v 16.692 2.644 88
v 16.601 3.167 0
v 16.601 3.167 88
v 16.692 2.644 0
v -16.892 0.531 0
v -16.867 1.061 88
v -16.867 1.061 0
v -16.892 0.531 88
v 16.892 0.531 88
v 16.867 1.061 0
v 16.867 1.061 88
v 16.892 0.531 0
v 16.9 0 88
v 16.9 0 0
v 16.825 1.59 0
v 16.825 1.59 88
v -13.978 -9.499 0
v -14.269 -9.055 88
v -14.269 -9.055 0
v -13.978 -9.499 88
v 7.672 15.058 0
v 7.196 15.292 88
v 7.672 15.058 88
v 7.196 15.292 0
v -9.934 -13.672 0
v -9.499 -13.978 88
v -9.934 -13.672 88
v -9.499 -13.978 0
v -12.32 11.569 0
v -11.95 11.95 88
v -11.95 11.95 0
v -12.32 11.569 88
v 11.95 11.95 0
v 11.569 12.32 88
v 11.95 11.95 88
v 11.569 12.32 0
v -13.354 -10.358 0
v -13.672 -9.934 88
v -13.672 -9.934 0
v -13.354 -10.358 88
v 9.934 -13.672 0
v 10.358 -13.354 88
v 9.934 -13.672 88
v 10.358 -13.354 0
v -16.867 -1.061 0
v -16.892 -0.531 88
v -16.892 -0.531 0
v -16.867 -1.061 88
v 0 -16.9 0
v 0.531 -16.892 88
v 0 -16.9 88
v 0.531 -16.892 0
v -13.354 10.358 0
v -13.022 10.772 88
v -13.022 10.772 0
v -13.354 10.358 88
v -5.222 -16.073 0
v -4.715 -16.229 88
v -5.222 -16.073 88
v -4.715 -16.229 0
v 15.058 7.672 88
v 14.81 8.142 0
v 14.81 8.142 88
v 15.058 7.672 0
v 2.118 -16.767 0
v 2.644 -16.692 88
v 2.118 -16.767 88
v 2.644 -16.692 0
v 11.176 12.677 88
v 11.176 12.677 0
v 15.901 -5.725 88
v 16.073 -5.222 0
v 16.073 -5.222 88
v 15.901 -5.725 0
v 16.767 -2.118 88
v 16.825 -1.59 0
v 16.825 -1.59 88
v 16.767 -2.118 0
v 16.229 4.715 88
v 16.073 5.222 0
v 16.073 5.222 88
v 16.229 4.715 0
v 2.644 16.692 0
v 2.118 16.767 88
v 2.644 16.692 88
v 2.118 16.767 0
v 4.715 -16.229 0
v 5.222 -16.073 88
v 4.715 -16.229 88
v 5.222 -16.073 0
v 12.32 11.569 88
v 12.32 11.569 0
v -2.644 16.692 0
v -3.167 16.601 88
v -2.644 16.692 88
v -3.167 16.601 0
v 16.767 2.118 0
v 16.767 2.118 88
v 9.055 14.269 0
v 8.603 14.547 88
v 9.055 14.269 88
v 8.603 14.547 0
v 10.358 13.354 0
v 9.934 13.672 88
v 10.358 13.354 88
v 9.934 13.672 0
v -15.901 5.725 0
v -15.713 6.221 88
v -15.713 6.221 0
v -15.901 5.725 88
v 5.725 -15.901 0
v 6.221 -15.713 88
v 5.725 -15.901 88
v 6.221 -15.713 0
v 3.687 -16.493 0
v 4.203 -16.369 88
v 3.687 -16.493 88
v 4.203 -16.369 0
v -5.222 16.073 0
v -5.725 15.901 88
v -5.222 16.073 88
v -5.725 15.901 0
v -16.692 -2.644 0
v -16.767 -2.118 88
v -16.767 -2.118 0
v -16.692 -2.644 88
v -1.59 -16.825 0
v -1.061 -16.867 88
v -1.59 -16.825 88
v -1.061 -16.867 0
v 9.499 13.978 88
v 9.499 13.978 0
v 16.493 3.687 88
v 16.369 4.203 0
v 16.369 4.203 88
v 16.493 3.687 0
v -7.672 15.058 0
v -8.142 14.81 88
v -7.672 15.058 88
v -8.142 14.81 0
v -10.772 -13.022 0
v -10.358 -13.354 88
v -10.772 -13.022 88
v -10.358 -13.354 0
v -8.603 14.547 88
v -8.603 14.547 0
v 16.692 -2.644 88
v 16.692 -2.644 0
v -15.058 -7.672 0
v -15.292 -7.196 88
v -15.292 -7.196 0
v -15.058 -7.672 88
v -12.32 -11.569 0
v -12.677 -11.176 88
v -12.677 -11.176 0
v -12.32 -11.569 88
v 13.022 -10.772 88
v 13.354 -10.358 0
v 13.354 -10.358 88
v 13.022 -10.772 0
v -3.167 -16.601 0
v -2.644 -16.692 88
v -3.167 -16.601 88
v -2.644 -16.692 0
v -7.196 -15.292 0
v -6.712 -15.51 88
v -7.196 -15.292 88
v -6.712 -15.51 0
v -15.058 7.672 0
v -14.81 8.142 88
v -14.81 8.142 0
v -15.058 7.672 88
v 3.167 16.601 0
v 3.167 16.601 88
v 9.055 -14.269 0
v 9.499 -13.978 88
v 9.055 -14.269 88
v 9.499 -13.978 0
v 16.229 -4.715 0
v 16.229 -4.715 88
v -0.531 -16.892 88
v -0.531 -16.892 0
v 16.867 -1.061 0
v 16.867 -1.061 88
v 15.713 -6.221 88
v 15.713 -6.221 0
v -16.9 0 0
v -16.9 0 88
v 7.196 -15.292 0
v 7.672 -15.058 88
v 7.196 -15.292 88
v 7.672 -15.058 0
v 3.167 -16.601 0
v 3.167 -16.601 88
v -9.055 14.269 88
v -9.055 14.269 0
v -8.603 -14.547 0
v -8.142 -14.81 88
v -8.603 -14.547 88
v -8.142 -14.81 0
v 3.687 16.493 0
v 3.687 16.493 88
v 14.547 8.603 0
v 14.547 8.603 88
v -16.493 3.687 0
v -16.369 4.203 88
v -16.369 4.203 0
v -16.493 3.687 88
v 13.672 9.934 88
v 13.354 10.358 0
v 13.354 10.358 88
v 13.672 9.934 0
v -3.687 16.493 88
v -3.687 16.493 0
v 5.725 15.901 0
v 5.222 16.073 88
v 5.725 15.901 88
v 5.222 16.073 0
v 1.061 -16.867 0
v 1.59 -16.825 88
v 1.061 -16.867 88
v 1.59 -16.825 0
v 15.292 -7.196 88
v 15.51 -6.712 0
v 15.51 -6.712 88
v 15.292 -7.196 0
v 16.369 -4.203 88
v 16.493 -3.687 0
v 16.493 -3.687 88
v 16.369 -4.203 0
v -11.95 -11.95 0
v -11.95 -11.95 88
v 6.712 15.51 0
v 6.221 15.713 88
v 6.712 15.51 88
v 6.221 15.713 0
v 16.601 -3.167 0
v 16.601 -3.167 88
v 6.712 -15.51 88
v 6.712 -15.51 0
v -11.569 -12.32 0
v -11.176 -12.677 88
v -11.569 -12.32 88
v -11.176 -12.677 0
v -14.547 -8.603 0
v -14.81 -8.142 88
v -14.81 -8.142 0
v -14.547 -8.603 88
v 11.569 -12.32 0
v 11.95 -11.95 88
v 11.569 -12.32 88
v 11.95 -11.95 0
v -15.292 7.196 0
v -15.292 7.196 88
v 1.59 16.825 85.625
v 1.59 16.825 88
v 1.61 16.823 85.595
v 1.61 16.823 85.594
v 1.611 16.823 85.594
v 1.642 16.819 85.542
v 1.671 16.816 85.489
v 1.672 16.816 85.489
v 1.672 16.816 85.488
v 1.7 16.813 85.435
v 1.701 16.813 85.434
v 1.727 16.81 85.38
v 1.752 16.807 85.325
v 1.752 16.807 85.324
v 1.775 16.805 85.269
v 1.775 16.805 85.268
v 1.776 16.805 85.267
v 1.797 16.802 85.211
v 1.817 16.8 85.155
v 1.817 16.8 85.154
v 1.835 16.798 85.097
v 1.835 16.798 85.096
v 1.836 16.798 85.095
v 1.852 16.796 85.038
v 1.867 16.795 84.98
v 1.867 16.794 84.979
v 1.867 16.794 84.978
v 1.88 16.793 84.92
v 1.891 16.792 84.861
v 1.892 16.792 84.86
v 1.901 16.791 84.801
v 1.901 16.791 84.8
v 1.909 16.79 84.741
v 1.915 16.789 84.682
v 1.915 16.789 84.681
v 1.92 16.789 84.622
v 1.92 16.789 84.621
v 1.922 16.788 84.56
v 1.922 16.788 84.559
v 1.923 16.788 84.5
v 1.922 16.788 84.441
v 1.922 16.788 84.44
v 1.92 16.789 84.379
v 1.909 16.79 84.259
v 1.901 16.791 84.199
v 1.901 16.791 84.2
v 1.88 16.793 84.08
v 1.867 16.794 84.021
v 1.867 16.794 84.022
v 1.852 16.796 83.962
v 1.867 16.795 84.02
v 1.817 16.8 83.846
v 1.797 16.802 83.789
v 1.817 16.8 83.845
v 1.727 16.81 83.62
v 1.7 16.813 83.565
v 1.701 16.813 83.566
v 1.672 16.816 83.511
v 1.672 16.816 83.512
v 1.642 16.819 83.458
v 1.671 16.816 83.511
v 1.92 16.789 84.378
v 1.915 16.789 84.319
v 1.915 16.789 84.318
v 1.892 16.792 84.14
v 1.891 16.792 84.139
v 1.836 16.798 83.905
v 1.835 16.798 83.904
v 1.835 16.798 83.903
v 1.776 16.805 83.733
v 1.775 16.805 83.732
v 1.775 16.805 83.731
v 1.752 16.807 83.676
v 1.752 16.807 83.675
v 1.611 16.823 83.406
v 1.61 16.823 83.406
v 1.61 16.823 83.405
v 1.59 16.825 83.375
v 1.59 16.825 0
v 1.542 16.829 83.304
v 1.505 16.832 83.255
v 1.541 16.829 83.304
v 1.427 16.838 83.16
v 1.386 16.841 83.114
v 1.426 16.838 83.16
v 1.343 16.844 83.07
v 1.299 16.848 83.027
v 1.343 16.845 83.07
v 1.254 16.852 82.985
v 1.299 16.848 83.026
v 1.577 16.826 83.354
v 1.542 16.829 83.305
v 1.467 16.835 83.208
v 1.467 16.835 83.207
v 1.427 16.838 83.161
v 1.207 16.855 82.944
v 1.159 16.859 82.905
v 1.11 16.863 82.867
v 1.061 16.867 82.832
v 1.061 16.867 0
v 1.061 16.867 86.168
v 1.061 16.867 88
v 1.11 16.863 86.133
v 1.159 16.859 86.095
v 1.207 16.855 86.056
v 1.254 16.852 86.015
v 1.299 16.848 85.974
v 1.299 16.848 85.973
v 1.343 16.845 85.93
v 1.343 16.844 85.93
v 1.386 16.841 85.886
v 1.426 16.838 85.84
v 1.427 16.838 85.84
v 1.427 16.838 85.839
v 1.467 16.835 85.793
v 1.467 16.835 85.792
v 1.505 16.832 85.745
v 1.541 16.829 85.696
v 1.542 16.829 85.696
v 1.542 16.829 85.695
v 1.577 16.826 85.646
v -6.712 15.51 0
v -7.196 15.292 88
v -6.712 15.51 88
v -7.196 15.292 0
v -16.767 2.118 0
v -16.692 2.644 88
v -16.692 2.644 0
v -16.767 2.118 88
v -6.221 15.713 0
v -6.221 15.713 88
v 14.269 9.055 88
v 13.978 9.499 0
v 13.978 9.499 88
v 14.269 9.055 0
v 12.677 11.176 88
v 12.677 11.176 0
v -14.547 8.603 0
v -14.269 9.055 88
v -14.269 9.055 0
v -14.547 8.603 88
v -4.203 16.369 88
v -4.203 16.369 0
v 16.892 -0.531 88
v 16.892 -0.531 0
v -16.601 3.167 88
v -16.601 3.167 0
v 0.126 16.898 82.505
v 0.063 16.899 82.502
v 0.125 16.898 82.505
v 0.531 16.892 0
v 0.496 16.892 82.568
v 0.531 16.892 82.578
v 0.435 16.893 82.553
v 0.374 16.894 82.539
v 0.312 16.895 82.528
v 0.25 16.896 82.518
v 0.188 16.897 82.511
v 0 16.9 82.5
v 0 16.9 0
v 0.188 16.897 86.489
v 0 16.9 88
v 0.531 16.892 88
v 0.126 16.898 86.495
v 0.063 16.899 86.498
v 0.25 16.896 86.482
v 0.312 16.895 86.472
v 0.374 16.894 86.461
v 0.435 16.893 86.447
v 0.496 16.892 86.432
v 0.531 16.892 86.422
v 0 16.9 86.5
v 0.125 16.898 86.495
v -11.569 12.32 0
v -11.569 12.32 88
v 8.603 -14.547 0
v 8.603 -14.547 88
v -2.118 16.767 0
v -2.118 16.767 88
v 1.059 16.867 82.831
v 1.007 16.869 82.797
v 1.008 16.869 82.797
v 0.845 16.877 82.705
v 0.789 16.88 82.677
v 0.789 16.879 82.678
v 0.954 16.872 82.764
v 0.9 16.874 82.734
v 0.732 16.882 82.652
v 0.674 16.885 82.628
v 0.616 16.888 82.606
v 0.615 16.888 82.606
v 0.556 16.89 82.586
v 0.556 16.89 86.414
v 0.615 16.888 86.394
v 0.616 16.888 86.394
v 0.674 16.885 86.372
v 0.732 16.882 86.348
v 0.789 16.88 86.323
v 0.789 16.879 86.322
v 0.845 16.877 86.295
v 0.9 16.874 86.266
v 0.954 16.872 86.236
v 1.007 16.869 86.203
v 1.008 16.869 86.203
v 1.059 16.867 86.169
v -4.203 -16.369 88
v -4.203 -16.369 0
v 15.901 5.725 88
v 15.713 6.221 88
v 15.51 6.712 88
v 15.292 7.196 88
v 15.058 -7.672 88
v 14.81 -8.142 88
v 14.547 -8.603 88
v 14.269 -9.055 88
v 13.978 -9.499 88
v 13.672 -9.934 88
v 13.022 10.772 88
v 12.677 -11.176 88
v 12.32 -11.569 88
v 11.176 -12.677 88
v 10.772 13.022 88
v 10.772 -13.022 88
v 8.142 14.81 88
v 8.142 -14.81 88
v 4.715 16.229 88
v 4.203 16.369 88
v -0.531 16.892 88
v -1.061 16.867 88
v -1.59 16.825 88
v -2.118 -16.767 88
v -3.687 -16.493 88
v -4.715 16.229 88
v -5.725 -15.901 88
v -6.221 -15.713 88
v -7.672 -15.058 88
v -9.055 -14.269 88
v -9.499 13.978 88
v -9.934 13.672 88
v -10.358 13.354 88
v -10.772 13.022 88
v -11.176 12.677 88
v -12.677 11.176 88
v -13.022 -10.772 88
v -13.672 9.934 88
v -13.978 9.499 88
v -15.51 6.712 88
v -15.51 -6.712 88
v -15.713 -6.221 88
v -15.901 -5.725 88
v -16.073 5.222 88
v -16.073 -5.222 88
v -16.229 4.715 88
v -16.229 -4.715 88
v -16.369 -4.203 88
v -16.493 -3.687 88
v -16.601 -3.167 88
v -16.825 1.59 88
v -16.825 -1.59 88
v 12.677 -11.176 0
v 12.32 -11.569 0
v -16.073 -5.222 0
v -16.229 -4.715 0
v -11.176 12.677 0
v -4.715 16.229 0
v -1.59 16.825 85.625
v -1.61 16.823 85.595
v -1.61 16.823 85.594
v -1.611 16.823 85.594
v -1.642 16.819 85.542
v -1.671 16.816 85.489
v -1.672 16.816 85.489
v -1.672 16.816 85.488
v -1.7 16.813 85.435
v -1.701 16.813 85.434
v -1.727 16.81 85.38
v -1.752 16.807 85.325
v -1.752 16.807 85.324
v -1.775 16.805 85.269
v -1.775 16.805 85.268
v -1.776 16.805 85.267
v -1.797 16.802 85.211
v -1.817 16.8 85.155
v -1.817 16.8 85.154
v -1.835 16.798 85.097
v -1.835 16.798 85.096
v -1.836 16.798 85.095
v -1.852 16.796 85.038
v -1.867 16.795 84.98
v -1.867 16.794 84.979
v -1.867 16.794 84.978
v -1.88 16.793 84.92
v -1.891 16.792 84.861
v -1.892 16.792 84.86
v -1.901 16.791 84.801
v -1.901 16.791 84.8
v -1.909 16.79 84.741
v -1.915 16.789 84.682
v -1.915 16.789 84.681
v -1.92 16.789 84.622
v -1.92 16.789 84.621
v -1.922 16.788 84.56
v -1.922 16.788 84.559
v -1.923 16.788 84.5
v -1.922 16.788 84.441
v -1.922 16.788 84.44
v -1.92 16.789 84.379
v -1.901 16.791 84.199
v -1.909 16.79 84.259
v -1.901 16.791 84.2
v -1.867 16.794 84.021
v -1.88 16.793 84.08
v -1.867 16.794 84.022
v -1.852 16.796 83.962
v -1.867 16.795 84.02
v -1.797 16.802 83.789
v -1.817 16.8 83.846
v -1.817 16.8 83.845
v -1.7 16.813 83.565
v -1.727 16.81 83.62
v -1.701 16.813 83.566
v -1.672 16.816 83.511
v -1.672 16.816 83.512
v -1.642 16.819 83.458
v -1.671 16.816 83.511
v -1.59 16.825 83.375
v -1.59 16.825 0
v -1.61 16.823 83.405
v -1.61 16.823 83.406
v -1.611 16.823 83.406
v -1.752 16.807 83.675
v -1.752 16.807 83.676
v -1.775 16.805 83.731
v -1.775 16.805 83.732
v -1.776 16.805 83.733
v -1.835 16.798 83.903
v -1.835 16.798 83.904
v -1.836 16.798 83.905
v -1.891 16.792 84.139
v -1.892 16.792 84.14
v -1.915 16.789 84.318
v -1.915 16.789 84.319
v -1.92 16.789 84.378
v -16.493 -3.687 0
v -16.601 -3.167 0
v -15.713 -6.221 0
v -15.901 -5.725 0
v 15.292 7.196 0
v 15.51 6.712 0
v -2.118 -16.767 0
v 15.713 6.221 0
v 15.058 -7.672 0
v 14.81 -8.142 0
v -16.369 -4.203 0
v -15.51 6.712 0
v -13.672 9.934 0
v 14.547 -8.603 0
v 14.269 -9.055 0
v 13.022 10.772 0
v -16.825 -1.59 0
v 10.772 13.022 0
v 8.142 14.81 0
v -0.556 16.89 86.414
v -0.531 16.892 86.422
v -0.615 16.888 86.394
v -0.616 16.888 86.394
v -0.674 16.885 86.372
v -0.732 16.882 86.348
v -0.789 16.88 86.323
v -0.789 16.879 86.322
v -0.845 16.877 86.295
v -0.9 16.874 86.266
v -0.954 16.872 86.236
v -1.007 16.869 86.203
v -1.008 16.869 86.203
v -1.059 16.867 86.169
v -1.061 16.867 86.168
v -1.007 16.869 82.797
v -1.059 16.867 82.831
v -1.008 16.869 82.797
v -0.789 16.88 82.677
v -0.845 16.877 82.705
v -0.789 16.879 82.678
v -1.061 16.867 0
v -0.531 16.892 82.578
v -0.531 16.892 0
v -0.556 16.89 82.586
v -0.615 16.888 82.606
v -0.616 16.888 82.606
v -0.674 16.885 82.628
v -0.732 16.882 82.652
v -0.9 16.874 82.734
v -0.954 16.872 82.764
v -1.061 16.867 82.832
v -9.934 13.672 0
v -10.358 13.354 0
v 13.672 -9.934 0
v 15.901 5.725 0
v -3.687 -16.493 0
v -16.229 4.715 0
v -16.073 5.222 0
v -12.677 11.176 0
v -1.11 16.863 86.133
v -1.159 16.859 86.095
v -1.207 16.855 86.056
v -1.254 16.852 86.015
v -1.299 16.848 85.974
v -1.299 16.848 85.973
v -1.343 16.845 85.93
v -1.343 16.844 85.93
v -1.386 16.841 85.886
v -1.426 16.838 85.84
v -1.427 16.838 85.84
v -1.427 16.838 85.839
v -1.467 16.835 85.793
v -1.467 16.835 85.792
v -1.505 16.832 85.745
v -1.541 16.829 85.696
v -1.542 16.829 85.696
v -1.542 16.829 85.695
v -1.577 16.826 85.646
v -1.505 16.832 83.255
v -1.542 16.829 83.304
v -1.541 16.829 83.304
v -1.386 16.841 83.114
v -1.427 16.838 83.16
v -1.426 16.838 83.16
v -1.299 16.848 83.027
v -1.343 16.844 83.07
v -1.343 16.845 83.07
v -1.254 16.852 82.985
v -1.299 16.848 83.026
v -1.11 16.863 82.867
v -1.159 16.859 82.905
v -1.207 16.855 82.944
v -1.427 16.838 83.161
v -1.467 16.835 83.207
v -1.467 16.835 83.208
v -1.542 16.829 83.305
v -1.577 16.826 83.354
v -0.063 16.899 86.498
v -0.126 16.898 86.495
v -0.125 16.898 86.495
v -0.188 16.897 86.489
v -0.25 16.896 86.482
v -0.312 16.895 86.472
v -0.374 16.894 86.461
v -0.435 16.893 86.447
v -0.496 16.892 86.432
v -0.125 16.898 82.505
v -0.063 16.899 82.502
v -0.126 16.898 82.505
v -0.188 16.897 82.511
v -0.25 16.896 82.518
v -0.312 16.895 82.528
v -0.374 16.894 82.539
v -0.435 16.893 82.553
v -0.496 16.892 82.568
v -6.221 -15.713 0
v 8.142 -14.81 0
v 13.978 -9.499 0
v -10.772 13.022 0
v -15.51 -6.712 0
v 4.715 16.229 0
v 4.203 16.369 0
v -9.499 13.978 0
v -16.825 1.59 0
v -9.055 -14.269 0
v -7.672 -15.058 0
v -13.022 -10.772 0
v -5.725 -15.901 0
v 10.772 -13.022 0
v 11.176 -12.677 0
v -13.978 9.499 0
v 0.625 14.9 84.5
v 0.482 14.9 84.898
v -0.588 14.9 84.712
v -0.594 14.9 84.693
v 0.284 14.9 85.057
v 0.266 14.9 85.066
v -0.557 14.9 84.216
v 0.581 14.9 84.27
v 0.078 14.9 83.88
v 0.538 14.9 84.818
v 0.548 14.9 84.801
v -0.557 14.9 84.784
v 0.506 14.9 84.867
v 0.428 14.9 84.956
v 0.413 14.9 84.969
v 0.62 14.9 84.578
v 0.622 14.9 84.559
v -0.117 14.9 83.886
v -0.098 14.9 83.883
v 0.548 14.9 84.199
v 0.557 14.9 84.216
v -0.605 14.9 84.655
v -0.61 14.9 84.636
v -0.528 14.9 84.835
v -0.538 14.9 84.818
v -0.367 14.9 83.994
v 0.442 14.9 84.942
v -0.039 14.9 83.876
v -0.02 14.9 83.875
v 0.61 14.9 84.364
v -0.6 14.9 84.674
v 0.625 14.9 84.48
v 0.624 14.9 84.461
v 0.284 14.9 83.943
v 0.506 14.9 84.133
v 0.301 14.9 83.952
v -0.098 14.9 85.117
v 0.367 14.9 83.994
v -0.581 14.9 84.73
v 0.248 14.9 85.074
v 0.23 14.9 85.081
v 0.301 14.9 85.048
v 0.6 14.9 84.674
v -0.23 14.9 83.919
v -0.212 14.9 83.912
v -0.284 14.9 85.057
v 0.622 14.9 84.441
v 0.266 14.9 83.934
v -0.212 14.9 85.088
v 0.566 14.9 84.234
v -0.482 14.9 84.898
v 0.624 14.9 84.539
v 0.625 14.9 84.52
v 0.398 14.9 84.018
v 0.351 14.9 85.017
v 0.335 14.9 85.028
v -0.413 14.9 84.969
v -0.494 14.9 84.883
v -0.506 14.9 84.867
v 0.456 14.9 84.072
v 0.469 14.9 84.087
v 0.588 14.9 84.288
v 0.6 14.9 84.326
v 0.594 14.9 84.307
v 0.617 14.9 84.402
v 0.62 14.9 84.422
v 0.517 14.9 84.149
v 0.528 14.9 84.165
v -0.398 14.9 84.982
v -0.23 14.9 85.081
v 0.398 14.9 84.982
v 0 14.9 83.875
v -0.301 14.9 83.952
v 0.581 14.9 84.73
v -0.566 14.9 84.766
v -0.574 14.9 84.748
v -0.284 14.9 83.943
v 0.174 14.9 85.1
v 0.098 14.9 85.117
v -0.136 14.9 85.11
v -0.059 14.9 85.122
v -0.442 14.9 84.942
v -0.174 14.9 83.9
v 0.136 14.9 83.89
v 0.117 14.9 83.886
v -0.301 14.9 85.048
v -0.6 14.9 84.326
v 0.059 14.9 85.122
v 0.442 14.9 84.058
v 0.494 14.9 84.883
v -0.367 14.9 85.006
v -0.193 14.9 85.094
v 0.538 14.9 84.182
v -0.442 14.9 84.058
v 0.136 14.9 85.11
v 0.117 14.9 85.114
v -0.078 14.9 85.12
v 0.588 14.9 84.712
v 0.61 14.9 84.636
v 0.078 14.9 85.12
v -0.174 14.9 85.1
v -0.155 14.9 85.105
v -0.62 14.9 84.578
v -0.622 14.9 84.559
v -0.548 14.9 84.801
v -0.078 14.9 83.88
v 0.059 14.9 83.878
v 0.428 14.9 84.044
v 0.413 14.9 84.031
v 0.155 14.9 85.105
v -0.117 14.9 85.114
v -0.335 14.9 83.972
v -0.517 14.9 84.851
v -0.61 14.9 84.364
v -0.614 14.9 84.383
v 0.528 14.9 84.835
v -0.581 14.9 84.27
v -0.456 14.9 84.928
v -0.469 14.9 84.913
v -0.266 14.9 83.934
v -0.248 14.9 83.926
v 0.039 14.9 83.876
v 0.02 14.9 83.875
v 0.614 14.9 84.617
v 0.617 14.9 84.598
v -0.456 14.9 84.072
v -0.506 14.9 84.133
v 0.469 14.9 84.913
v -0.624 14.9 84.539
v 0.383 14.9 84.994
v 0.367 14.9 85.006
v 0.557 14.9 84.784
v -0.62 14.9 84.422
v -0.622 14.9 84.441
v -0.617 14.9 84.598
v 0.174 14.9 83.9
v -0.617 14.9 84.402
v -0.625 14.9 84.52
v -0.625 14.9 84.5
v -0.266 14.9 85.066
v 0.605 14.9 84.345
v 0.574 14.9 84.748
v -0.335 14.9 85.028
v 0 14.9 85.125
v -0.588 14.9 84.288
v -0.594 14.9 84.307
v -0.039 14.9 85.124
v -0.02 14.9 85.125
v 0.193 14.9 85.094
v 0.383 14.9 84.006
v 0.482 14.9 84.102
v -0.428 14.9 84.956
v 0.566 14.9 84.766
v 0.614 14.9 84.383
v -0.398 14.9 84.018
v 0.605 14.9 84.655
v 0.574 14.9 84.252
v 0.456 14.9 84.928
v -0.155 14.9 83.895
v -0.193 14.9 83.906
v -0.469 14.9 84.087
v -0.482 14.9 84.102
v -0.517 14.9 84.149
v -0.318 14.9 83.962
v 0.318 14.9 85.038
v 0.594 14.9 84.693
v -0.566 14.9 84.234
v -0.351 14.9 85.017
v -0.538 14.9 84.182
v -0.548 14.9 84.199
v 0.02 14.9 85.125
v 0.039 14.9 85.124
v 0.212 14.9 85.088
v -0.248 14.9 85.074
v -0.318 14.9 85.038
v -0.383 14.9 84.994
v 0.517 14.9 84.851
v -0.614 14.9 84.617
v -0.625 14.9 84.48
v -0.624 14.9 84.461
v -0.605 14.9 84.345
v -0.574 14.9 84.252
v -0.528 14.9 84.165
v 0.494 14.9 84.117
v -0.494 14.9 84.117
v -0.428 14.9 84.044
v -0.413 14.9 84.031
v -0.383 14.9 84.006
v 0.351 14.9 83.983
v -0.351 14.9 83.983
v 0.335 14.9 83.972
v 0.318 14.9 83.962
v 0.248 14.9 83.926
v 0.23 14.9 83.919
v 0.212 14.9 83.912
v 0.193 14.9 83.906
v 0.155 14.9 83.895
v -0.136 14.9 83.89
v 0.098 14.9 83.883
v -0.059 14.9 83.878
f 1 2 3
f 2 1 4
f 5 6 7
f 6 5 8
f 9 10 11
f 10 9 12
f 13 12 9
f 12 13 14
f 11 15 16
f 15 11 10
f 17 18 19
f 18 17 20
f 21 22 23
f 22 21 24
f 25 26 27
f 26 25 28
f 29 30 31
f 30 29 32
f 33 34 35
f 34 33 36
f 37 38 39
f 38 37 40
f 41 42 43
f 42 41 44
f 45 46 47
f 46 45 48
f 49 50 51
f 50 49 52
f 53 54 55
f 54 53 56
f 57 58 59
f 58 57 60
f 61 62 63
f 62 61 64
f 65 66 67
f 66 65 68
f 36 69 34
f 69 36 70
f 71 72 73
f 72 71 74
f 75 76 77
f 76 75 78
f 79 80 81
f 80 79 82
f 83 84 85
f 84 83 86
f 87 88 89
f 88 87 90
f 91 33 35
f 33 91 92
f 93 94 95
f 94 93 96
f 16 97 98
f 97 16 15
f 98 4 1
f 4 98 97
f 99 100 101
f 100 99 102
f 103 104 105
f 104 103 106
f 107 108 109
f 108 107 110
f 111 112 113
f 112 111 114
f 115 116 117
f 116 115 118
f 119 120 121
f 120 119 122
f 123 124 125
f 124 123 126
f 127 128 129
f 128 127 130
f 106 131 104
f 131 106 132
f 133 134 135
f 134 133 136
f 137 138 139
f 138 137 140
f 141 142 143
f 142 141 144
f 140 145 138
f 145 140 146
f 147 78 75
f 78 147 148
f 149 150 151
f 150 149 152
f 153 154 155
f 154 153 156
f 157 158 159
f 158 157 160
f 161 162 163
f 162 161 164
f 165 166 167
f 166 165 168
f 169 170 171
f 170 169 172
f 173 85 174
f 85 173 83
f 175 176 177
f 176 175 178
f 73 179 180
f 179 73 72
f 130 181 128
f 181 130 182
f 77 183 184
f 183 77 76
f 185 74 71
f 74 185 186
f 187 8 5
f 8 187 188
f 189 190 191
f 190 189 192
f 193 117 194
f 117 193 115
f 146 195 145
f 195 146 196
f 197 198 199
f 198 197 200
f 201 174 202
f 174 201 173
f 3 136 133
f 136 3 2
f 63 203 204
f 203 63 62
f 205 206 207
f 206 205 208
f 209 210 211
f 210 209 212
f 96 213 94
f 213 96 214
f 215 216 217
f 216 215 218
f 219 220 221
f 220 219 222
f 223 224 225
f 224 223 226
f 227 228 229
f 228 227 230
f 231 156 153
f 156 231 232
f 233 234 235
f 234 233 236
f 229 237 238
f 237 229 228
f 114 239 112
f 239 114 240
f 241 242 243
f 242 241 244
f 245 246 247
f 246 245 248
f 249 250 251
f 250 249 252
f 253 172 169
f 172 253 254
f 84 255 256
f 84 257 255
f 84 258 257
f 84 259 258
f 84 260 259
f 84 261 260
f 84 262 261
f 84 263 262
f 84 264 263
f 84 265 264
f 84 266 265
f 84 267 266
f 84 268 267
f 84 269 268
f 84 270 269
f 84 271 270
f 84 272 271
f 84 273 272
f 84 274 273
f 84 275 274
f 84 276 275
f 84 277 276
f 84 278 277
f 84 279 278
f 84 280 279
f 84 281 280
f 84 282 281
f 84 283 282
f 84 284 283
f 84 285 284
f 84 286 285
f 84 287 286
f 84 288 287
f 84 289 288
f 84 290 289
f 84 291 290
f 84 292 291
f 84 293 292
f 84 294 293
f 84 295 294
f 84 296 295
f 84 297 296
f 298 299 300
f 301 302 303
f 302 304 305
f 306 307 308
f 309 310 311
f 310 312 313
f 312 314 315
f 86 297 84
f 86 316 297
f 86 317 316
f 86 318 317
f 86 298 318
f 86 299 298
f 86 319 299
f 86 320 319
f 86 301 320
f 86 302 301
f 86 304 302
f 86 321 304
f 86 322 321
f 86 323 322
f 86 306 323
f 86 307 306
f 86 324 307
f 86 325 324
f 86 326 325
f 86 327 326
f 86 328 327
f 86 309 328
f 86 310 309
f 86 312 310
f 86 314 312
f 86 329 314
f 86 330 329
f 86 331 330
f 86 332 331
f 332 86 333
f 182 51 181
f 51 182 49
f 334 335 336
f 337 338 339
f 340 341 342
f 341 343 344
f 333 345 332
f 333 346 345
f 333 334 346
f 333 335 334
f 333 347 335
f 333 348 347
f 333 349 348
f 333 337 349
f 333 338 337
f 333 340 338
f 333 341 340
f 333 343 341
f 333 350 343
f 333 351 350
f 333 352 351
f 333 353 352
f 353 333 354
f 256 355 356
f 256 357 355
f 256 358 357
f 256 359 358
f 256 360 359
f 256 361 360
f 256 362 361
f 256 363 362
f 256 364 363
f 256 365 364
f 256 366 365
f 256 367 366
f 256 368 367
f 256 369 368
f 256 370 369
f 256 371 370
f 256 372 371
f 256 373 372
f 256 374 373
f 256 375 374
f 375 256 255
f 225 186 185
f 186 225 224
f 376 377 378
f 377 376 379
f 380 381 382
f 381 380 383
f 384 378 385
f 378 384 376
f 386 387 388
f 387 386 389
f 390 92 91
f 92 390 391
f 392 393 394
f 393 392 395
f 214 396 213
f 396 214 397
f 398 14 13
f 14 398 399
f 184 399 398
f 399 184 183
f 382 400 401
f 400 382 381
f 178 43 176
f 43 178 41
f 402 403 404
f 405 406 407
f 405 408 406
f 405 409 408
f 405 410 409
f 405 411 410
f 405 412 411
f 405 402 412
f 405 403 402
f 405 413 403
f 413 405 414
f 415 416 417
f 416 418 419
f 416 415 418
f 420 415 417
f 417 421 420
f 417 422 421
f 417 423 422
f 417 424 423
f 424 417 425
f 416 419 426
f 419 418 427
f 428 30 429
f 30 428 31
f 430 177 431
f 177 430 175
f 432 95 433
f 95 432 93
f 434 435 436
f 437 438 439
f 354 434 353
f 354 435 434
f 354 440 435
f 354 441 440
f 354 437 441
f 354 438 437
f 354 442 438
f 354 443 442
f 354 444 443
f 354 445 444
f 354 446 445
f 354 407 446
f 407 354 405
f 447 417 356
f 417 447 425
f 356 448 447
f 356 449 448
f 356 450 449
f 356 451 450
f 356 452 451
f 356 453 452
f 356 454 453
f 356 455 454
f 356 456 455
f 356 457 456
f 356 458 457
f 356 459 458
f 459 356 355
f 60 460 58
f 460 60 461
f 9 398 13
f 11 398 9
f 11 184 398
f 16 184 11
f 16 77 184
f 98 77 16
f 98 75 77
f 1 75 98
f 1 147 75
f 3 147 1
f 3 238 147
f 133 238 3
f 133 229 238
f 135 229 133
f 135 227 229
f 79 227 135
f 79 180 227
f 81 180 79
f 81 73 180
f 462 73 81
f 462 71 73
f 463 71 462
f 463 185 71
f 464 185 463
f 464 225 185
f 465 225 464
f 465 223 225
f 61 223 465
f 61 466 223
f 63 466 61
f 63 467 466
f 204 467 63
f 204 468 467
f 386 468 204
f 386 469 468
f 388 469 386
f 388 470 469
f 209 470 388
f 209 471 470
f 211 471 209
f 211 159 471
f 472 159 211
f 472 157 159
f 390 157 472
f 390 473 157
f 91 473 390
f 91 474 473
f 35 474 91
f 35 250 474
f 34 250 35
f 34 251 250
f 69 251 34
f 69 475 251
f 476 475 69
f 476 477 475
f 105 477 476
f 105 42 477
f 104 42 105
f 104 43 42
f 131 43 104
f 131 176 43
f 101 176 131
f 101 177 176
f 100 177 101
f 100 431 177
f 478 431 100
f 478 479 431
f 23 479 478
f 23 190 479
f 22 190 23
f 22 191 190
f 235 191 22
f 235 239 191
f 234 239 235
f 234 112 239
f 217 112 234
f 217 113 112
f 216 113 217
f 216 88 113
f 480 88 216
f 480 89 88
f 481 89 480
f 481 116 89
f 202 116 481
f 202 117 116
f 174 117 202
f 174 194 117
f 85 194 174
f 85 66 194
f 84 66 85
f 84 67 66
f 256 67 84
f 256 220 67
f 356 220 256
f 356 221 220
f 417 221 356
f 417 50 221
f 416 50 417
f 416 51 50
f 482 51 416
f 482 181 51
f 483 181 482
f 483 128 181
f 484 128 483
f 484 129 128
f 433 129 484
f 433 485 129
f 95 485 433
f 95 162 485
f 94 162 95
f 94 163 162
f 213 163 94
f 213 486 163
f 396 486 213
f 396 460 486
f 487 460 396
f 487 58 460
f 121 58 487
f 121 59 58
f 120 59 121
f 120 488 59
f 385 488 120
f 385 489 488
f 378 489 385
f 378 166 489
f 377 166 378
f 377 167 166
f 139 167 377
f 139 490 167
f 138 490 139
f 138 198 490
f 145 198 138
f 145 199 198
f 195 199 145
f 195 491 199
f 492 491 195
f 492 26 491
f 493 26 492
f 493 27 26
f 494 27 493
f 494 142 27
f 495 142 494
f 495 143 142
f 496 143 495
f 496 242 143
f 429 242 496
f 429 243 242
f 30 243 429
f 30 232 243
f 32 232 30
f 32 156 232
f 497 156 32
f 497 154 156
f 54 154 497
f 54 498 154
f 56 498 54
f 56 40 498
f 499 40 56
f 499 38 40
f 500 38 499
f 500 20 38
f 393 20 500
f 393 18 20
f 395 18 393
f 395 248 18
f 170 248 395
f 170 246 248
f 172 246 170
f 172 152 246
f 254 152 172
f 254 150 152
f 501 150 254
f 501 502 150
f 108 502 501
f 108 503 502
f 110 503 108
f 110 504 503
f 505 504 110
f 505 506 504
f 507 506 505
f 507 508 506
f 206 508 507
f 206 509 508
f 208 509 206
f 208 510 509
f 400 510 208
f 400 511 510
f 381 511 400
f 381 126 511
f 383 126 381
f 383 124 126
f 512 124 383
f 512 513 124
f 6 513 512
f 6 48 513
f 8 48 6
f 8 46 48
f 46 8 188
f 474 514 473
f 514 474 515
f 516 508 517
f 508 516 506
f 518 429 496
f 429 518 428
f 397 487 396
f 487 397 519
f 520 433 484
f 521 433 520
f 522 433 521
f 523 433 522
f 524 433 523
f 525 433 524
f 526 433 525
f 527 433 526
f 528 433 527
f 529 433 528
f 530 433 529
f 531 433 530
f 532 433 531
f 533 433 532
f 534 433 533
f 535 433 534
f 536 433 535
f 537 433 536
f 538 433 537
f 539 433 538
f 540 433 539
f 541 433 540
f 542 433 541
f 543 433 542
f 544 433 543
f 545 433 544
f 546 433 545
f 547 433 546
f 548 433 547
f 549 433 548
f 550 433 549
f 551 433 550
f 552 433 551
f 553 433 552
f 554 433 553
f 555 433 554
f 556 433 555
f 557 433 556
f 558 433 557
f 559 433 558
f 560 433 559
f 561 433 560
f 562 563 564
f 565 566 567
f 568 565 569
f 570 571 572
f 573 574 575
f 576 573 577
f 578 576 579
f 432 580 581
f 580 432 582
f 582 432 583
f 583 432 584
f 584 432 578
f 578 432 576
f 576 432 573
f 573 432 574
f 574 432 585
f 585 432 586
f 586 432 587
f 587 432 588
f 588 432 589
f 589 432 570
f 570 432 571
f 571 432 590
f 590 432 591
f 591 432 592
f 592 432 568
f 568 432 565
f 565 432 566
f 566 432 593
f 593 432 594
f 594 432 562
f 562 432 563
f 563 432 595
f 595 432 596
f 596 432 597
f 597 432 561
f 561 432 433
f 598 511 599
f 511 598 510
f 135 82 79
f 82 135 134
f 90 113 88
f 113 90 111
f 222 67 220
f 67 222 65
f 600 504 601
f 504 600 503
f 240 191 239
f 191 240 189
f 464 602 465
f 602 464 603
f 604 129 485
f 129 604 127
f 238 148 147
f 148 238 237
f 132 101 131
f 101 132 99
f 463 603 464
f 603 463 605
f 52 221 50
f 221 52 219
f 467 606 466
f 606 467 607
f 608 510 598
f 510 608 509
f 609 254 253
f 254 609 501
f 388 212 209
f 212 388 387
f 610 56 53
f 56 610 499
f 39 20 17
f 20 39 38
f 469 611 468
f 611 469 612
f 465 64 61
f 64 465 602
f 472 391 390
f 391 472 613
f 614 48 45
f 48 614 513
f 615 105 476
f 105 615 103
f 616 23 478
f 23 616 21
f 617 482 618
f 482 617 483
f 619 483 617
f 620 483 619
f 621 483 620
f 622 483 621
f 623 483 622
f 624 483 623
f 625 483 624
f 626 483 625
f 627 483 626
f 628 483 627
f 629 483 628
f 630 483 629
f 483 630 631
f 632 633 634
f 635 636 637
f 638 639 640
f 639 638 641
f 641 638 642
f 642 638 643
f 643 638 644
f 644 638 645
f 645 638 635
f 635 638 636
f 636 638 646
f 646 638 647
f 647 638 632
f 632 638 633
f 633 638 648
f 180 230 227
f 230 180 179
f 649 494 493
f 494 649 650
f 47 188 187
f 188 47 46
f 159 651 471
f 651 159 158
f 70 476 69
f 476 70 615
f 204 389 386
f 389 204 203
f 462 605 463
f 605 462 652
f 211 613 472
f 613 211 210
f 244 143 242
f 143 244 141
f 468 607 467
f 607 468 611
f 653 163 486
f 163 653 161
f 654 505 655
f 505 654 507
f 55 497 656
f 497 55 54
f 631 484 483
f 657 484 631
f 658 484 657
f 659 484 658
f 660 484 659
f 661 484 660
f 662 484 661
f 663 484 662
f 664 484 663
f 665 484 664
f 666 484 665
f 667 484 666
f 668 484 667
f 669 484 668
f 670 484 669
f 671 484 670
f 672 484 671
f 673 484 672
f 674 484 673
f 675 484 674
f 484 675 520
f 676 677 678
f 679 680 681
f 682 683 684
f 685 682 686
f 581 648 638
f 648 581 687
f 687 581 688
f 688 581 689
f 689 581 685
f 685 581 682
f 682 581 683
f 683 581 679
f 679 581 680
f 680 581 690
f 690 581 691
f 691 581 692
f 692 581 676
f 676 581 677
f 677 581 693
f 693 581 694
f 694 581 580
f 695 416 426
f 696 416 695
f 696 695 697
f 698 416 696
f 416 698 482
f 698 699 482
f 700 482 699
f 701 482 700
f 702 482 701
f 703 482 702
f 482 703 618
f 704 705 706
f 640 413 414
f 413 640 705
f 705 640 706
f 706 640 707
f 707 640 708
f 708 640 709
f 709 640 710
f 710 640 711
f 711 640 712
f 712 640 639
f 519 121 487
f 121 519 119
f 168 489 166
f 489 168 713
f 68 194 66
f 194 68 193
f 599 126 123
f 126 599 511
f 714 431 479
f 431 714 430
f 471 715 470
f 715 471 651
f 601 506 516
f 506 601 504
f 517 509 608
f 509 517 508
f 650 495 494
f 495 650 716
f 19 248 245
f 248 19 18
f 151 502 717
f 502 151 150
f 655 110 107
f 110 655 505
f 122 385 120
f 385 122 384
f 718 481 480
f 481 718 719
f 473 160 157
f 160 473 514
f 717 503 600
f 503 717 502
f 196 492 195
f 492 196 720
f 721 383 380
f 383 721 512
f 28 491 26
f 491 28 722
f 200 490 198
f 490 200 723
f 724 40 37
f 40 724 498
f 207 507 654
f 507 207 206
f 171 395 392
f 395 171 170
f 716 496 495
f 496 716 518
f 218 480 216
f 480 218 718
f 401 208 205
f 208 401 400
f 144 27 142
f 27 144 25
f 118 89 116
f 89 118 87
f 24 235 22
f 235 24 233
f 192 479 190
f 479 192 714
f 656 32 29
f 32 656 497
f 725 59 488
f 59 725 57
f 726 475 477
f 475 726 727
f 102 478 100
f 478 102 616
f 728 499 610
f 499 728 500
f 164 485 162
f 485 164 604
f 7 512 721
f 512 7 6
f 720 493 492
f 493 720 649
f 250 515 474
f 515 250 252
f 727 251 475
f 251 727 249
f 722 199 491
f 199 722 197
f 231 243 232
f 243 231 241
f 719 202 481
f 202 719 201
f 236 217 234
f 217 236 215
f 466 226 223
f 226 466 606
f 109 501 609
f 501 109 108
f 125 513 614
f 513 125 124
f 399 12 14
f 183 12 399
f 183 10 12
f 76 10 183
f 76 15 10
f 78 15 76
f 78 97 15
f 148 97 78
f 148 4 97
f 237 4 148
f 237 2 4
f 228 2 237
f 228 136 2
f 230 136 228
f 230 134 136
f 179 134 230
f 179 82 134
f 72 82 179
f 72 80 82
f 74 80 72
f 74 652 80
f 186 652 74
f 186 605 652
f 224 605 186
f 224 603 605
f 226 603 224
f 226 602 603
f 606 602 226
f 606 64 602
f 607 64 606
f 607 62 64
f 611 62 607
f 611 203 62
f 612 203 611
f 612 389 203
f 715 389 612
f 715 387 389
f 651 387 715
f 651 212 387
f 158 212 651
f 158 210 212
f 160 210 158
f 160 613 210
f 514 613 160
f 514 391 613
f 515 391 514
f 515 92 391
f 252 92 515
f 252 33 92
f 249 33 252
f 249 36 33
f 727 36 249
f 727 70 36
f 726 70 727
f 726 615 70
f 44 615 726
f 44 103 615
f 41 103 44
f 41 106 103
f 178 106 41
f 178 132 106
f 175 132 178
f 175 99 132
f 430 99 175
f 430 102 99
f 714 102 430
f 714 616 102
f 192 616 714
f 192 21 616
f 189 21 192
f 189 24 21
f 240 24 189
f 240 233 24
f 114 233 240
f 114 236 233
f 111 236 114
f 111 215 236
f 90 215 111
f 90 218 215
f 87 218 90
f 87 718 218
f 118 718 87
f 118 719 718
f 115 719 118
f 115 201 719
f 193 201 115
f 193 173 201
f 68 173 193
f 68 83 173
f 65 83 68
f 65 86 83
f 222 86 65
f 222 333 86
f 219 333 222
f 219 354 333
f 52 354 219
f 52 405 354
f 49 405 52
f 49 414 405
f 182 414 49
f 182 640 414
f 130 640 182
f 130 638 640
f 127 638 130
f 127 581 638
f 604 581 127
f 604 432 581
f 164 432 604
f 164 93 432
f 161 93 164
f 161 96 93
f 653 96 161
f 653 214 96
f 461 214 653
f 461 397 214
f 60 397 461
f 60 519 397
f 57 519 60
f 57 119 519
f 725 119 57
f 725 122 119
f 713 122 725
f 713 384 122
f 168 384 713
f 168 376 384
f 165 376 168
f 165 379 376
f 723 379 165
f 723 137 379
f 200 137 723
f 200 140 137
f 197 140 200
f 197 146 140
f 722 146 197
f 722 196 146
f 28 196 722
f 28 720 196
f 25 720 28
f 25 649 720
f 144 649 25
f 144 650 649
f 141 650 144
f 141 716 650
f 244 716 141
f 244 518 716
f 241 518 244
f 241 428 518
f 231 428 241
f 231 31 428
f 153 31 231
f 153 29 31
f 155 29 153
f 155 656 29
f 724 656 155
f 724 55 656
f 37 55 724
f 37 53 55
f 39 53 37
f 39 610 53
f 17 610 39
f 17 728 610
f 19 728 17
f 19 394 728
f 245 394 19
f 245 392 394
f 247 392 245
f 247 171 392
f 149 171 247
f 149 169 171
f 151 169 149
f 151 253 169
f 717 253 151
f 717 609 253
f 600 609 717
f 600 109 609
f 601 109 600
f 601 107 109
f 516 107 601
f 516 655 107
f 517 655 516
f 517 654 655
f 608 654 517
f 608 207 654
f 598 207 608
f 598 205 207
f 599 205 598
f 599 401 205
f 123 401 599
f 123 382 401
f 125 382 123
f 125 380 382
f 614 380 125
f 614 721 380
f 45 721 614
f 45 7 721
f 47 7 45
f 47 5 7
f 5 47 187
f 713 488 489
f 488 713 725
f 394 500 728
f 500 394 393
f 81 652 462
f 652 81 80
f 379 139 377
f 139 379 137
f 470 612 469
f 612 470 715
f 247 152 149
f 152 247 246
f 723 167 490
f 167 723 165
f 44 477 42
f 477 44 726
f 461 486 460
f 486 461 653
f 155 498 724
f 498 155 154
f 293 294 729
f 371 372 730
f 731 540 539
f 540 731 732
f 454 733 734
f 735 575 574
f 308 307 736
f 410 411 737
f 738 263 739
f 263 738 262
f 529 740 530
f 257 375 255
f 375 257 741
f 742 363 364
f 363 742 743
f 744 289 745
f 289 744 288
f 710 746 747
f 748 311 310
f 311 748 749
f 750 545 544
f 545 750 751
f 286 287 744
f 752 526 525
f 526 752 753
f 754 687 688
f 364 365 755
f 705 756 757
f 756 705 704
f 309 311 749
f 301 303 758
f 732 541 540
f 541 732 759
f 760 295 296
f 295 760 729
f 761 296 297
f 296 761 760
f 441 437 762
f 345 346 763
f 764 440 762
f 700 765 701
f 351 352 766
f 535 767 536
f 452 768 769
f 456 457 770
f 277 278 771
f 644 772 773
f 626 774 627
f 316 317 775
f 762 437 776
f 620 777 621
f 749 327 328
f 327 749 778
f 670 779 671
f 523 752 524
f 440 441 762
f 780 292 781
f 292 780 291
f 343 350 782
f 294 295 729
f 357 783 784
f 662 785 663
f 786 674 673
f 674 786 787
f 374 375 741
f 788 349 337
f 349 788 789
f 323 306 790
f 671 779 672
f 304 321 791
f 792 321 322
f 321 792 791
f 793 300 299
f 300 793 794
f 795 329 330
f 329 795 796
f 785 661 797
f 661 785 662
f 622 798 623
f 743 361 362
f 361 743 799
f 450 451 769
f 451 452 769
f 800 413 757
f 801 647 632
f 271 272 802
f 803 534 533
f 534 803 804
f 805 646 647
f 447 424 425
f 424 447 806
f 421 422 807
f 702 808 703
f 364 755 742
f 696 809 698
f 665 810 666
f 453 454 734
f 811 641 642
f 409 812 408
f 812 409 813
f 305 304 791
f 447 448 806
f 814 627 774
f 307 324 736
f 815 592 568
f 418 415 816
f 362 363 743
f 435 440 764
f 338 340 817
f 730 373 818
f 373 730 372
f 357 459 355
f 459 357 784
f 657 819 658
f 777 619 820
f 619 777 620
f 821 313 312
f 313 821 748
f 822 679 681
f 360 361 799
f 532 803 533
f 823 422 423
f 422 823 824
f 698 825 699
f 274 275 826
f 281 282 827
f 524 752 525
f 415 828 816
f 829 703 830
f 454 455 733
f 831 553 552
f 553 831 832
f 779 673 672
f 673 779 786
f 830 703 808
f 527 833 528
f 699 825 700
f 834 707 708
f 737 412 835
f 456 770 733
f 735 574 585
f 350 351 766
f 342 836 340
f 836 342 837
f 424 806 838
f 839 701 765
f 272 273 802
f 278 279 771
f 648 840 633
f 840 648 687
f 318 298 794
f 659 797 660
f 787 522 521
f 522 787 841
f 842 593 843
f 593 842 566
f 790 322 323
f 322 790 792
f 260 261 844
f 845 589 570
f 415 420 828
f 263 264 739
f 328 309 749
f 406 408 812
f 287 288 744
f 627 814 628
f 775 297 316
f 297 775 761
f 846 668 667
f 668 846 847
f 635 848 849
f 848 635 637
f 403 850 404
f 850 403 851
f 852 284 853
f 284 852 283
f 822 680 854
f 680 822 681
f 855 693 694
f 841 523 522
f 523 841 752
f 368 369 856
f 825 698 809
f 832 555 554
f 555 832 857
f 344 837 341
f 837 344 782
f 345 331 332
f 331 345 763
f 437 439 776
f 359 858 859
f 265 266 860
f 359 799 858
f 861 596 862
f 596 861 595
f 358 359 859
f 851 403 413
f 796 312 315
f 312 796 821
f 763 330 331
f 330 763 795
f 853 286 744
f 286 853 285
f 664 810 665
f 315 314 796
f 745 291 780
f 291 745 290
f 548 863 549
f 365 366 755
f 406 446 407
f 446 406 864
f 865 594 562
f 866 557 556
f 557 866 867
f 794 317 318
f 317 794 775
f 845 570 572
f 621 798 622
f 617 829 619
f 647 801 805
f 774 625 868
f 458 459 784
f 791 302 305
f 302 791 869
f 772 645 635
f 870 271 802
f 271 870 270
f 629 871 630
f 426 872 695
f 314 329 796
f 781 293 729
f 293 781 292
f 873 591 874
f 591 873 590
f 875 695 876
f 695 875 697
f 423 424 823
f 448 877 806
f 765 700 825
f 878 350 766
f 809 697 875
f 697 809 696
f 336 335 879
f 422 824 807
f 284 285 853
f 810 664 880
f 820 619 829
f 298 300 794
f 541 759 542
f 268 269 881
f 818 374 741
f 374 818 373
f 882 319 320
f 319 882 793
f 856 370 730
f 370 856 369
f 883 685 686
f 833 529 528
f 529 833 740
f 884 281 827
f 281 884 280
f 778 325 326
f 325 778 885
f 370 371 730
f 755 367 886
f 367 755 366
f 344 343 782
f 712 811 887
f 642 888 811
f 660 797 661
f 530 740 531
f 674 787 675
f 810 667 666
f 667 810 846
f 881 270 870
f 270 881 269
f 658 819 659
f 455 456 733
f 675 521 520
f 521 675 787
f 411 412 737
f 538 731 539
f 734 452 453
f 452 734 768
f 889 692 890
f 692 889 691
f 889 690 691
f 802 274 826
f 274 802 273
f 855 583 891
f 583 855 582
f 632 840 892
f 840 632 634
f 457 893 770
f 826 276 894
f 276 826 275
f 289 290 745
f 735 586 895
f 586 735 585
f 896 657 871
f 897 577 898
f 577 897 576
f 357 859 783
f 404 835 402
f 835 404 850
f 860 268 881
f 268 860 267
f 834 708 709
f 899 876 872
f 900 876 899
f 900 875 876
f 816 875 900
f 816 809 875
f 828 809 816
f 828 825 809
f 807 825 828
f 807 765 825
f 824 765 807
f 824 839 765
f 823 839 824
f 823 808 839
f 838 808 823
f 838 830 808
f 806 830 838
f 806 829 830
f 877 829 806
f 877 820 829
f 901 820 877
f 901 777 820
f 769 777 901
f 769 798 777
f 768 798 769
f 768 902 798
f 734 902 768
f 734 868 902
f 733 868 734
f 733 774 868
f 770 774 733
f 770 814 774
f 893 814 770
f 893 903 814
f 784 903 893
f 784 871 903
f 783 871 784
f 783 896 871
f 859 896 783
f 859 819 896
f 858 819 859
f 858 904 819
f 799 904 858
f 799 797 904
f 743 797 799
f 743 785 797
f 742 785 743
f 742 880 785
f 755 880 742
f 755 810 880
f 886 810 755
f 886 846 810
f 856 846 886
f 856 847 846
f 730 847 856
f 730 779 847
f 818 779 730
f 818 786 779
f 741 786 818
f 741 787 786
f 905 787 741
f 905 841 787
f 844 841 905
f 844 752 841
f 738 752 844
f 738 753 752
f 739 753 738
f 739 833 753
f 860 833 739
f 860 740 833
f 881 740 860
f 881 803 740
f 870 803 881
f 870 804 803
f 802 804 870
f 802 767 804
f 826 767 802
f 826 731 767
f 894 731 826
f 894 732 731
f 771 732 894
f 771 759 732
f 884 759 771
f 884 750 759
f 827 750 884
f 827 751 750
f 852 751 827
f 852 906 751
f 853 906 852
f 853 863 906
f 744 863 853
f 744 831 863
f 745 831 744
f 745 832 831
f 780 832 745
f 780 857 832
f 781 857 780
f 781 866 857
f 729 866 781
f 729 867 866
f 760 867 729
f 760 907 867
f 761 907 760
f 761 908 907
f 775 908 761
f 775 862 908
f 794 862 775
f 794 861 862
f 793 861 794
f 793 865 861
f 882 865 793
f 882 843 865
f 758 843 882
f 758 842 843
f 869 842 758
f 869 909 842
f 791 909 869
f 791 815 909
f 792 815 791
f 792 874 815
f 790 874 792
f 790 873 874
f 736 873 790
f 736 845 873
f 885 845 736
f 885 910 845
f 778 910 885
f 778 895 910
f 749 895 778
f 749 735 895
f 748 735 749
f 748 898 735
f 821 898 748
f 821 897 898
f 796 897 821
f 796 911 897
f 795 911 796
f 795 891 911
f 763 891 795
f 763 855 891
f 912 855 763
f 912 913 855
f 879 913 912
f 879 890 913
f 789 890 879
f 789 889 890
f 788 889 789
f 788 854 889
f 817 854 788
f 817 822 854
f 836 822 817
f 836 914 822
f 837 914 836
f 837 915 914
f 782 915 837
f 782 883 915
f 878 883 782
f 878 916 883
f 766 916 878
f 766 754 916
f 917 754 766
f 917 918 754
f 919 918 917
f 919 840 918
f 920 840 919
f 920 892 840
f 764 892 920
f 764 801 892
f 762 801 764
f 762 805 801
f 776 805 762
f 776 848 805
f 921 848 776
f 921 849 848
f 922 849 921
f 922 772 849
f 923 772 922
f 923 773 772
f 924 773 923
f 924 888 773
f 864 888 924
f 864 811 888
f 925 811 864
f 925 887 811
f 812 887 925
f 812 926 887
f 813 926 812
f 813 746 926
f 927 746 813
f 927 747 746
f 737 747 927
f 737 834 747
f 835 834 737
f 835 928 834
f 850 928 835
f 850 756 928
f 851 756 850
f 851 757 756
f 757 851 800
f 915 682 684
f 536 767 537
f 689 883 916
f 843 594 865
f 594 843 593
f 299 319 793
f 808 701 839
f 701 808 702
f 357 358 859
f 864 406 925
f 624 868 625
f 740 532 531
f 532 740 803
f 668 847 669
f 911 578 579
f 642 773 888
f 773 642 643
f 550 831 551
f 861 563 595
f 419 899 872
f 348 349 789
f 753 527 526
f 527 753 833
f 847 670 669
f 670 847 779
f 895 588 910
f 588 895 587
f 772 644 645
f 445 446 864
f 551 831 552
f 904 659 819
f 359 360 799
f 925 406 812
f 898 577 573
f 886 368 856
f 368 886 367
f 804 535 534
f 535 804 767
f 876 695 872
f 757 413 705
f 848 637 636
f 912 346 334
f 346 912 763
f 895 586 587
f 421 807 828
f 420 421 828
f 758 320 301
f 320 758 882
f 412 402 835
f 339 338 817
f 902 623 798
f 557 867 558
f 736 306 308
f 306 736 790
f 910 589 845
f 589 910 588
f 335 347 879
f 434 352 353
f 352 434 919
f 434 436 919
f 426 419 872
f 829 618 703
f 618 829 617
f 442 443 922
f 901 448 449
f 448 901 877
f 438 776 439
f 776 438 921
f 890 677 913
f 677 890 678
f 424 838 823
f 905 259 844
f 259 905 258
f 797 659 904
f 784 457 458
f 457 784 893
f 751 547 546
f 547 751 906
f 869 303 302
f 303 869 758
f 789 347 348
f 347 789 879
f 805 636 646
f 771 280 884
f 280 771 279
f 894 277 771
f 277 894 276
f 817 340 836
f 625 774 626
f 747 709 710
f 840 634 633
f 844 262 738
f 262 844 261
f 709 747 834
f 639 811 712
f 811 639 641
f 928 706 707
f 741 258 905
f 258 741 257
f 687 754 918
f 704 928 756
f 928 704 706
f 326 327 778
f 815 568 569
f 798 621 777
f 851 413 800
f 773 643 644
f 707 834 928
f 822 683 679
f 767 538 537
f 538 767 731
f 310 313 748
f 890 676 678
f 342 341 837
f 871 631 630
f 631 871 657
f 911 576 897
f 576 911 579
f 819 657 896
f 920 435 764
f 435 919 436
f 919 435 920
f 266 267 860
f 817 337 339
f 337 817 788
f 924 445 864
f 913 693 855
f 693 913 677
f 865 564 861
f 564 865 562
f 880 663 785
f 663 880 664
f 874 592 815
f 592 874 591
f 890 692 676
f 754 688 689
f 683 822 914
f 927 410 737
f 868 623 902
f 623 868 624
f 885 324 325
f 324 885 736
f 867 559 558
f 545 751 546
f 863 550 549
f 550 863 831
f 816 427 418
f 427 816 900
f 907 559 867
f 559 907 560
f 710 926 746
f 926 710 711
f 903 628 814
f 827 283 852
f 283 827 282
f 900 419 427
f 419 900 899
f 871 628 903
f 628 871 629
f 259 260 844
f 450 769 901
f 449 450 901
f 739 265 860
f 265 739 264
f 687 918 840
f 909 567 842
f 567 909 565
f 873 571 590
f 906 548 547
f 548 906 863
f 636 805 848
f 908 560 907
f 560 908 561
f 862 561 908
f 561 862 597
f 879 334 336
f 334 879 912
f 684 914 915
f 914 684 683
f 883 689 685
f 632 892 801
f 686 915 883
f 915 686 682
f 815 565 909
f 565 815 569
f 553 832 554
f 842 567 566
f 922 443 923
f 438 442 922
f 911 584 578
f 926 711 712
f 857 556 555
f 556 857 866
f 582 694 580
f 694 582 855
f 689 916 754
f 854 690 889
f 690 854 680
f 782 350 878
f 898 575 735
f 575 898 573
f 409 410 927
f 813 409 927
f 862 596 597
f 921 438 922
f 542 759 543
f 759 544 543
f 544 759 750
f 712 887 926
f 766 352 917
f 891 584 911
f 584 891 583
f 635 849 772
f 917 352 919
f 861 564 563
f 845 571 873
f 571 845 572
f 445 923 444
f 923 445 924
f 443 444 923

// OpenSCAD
//These measurements work well on my machine for PETG at 100% scale and 101% flow and PLA at 104% scale and 99% flow.
cylinder_diameter=33.8;
cylinder_height=88;
cone_base=4;
cone_tip=1.25;
cone_height=2;
$fn=200;

difference(){
cylinder(d=cylinder_diameter,h=cylinder_height);
translate([0,cylinder_diameter/2,cylinder_height-cone_base/2-1.5])
rotate([90,0,0]){
cylinder(d1=cone_base,d2=cone_tip,h=cone_height);
}
}
